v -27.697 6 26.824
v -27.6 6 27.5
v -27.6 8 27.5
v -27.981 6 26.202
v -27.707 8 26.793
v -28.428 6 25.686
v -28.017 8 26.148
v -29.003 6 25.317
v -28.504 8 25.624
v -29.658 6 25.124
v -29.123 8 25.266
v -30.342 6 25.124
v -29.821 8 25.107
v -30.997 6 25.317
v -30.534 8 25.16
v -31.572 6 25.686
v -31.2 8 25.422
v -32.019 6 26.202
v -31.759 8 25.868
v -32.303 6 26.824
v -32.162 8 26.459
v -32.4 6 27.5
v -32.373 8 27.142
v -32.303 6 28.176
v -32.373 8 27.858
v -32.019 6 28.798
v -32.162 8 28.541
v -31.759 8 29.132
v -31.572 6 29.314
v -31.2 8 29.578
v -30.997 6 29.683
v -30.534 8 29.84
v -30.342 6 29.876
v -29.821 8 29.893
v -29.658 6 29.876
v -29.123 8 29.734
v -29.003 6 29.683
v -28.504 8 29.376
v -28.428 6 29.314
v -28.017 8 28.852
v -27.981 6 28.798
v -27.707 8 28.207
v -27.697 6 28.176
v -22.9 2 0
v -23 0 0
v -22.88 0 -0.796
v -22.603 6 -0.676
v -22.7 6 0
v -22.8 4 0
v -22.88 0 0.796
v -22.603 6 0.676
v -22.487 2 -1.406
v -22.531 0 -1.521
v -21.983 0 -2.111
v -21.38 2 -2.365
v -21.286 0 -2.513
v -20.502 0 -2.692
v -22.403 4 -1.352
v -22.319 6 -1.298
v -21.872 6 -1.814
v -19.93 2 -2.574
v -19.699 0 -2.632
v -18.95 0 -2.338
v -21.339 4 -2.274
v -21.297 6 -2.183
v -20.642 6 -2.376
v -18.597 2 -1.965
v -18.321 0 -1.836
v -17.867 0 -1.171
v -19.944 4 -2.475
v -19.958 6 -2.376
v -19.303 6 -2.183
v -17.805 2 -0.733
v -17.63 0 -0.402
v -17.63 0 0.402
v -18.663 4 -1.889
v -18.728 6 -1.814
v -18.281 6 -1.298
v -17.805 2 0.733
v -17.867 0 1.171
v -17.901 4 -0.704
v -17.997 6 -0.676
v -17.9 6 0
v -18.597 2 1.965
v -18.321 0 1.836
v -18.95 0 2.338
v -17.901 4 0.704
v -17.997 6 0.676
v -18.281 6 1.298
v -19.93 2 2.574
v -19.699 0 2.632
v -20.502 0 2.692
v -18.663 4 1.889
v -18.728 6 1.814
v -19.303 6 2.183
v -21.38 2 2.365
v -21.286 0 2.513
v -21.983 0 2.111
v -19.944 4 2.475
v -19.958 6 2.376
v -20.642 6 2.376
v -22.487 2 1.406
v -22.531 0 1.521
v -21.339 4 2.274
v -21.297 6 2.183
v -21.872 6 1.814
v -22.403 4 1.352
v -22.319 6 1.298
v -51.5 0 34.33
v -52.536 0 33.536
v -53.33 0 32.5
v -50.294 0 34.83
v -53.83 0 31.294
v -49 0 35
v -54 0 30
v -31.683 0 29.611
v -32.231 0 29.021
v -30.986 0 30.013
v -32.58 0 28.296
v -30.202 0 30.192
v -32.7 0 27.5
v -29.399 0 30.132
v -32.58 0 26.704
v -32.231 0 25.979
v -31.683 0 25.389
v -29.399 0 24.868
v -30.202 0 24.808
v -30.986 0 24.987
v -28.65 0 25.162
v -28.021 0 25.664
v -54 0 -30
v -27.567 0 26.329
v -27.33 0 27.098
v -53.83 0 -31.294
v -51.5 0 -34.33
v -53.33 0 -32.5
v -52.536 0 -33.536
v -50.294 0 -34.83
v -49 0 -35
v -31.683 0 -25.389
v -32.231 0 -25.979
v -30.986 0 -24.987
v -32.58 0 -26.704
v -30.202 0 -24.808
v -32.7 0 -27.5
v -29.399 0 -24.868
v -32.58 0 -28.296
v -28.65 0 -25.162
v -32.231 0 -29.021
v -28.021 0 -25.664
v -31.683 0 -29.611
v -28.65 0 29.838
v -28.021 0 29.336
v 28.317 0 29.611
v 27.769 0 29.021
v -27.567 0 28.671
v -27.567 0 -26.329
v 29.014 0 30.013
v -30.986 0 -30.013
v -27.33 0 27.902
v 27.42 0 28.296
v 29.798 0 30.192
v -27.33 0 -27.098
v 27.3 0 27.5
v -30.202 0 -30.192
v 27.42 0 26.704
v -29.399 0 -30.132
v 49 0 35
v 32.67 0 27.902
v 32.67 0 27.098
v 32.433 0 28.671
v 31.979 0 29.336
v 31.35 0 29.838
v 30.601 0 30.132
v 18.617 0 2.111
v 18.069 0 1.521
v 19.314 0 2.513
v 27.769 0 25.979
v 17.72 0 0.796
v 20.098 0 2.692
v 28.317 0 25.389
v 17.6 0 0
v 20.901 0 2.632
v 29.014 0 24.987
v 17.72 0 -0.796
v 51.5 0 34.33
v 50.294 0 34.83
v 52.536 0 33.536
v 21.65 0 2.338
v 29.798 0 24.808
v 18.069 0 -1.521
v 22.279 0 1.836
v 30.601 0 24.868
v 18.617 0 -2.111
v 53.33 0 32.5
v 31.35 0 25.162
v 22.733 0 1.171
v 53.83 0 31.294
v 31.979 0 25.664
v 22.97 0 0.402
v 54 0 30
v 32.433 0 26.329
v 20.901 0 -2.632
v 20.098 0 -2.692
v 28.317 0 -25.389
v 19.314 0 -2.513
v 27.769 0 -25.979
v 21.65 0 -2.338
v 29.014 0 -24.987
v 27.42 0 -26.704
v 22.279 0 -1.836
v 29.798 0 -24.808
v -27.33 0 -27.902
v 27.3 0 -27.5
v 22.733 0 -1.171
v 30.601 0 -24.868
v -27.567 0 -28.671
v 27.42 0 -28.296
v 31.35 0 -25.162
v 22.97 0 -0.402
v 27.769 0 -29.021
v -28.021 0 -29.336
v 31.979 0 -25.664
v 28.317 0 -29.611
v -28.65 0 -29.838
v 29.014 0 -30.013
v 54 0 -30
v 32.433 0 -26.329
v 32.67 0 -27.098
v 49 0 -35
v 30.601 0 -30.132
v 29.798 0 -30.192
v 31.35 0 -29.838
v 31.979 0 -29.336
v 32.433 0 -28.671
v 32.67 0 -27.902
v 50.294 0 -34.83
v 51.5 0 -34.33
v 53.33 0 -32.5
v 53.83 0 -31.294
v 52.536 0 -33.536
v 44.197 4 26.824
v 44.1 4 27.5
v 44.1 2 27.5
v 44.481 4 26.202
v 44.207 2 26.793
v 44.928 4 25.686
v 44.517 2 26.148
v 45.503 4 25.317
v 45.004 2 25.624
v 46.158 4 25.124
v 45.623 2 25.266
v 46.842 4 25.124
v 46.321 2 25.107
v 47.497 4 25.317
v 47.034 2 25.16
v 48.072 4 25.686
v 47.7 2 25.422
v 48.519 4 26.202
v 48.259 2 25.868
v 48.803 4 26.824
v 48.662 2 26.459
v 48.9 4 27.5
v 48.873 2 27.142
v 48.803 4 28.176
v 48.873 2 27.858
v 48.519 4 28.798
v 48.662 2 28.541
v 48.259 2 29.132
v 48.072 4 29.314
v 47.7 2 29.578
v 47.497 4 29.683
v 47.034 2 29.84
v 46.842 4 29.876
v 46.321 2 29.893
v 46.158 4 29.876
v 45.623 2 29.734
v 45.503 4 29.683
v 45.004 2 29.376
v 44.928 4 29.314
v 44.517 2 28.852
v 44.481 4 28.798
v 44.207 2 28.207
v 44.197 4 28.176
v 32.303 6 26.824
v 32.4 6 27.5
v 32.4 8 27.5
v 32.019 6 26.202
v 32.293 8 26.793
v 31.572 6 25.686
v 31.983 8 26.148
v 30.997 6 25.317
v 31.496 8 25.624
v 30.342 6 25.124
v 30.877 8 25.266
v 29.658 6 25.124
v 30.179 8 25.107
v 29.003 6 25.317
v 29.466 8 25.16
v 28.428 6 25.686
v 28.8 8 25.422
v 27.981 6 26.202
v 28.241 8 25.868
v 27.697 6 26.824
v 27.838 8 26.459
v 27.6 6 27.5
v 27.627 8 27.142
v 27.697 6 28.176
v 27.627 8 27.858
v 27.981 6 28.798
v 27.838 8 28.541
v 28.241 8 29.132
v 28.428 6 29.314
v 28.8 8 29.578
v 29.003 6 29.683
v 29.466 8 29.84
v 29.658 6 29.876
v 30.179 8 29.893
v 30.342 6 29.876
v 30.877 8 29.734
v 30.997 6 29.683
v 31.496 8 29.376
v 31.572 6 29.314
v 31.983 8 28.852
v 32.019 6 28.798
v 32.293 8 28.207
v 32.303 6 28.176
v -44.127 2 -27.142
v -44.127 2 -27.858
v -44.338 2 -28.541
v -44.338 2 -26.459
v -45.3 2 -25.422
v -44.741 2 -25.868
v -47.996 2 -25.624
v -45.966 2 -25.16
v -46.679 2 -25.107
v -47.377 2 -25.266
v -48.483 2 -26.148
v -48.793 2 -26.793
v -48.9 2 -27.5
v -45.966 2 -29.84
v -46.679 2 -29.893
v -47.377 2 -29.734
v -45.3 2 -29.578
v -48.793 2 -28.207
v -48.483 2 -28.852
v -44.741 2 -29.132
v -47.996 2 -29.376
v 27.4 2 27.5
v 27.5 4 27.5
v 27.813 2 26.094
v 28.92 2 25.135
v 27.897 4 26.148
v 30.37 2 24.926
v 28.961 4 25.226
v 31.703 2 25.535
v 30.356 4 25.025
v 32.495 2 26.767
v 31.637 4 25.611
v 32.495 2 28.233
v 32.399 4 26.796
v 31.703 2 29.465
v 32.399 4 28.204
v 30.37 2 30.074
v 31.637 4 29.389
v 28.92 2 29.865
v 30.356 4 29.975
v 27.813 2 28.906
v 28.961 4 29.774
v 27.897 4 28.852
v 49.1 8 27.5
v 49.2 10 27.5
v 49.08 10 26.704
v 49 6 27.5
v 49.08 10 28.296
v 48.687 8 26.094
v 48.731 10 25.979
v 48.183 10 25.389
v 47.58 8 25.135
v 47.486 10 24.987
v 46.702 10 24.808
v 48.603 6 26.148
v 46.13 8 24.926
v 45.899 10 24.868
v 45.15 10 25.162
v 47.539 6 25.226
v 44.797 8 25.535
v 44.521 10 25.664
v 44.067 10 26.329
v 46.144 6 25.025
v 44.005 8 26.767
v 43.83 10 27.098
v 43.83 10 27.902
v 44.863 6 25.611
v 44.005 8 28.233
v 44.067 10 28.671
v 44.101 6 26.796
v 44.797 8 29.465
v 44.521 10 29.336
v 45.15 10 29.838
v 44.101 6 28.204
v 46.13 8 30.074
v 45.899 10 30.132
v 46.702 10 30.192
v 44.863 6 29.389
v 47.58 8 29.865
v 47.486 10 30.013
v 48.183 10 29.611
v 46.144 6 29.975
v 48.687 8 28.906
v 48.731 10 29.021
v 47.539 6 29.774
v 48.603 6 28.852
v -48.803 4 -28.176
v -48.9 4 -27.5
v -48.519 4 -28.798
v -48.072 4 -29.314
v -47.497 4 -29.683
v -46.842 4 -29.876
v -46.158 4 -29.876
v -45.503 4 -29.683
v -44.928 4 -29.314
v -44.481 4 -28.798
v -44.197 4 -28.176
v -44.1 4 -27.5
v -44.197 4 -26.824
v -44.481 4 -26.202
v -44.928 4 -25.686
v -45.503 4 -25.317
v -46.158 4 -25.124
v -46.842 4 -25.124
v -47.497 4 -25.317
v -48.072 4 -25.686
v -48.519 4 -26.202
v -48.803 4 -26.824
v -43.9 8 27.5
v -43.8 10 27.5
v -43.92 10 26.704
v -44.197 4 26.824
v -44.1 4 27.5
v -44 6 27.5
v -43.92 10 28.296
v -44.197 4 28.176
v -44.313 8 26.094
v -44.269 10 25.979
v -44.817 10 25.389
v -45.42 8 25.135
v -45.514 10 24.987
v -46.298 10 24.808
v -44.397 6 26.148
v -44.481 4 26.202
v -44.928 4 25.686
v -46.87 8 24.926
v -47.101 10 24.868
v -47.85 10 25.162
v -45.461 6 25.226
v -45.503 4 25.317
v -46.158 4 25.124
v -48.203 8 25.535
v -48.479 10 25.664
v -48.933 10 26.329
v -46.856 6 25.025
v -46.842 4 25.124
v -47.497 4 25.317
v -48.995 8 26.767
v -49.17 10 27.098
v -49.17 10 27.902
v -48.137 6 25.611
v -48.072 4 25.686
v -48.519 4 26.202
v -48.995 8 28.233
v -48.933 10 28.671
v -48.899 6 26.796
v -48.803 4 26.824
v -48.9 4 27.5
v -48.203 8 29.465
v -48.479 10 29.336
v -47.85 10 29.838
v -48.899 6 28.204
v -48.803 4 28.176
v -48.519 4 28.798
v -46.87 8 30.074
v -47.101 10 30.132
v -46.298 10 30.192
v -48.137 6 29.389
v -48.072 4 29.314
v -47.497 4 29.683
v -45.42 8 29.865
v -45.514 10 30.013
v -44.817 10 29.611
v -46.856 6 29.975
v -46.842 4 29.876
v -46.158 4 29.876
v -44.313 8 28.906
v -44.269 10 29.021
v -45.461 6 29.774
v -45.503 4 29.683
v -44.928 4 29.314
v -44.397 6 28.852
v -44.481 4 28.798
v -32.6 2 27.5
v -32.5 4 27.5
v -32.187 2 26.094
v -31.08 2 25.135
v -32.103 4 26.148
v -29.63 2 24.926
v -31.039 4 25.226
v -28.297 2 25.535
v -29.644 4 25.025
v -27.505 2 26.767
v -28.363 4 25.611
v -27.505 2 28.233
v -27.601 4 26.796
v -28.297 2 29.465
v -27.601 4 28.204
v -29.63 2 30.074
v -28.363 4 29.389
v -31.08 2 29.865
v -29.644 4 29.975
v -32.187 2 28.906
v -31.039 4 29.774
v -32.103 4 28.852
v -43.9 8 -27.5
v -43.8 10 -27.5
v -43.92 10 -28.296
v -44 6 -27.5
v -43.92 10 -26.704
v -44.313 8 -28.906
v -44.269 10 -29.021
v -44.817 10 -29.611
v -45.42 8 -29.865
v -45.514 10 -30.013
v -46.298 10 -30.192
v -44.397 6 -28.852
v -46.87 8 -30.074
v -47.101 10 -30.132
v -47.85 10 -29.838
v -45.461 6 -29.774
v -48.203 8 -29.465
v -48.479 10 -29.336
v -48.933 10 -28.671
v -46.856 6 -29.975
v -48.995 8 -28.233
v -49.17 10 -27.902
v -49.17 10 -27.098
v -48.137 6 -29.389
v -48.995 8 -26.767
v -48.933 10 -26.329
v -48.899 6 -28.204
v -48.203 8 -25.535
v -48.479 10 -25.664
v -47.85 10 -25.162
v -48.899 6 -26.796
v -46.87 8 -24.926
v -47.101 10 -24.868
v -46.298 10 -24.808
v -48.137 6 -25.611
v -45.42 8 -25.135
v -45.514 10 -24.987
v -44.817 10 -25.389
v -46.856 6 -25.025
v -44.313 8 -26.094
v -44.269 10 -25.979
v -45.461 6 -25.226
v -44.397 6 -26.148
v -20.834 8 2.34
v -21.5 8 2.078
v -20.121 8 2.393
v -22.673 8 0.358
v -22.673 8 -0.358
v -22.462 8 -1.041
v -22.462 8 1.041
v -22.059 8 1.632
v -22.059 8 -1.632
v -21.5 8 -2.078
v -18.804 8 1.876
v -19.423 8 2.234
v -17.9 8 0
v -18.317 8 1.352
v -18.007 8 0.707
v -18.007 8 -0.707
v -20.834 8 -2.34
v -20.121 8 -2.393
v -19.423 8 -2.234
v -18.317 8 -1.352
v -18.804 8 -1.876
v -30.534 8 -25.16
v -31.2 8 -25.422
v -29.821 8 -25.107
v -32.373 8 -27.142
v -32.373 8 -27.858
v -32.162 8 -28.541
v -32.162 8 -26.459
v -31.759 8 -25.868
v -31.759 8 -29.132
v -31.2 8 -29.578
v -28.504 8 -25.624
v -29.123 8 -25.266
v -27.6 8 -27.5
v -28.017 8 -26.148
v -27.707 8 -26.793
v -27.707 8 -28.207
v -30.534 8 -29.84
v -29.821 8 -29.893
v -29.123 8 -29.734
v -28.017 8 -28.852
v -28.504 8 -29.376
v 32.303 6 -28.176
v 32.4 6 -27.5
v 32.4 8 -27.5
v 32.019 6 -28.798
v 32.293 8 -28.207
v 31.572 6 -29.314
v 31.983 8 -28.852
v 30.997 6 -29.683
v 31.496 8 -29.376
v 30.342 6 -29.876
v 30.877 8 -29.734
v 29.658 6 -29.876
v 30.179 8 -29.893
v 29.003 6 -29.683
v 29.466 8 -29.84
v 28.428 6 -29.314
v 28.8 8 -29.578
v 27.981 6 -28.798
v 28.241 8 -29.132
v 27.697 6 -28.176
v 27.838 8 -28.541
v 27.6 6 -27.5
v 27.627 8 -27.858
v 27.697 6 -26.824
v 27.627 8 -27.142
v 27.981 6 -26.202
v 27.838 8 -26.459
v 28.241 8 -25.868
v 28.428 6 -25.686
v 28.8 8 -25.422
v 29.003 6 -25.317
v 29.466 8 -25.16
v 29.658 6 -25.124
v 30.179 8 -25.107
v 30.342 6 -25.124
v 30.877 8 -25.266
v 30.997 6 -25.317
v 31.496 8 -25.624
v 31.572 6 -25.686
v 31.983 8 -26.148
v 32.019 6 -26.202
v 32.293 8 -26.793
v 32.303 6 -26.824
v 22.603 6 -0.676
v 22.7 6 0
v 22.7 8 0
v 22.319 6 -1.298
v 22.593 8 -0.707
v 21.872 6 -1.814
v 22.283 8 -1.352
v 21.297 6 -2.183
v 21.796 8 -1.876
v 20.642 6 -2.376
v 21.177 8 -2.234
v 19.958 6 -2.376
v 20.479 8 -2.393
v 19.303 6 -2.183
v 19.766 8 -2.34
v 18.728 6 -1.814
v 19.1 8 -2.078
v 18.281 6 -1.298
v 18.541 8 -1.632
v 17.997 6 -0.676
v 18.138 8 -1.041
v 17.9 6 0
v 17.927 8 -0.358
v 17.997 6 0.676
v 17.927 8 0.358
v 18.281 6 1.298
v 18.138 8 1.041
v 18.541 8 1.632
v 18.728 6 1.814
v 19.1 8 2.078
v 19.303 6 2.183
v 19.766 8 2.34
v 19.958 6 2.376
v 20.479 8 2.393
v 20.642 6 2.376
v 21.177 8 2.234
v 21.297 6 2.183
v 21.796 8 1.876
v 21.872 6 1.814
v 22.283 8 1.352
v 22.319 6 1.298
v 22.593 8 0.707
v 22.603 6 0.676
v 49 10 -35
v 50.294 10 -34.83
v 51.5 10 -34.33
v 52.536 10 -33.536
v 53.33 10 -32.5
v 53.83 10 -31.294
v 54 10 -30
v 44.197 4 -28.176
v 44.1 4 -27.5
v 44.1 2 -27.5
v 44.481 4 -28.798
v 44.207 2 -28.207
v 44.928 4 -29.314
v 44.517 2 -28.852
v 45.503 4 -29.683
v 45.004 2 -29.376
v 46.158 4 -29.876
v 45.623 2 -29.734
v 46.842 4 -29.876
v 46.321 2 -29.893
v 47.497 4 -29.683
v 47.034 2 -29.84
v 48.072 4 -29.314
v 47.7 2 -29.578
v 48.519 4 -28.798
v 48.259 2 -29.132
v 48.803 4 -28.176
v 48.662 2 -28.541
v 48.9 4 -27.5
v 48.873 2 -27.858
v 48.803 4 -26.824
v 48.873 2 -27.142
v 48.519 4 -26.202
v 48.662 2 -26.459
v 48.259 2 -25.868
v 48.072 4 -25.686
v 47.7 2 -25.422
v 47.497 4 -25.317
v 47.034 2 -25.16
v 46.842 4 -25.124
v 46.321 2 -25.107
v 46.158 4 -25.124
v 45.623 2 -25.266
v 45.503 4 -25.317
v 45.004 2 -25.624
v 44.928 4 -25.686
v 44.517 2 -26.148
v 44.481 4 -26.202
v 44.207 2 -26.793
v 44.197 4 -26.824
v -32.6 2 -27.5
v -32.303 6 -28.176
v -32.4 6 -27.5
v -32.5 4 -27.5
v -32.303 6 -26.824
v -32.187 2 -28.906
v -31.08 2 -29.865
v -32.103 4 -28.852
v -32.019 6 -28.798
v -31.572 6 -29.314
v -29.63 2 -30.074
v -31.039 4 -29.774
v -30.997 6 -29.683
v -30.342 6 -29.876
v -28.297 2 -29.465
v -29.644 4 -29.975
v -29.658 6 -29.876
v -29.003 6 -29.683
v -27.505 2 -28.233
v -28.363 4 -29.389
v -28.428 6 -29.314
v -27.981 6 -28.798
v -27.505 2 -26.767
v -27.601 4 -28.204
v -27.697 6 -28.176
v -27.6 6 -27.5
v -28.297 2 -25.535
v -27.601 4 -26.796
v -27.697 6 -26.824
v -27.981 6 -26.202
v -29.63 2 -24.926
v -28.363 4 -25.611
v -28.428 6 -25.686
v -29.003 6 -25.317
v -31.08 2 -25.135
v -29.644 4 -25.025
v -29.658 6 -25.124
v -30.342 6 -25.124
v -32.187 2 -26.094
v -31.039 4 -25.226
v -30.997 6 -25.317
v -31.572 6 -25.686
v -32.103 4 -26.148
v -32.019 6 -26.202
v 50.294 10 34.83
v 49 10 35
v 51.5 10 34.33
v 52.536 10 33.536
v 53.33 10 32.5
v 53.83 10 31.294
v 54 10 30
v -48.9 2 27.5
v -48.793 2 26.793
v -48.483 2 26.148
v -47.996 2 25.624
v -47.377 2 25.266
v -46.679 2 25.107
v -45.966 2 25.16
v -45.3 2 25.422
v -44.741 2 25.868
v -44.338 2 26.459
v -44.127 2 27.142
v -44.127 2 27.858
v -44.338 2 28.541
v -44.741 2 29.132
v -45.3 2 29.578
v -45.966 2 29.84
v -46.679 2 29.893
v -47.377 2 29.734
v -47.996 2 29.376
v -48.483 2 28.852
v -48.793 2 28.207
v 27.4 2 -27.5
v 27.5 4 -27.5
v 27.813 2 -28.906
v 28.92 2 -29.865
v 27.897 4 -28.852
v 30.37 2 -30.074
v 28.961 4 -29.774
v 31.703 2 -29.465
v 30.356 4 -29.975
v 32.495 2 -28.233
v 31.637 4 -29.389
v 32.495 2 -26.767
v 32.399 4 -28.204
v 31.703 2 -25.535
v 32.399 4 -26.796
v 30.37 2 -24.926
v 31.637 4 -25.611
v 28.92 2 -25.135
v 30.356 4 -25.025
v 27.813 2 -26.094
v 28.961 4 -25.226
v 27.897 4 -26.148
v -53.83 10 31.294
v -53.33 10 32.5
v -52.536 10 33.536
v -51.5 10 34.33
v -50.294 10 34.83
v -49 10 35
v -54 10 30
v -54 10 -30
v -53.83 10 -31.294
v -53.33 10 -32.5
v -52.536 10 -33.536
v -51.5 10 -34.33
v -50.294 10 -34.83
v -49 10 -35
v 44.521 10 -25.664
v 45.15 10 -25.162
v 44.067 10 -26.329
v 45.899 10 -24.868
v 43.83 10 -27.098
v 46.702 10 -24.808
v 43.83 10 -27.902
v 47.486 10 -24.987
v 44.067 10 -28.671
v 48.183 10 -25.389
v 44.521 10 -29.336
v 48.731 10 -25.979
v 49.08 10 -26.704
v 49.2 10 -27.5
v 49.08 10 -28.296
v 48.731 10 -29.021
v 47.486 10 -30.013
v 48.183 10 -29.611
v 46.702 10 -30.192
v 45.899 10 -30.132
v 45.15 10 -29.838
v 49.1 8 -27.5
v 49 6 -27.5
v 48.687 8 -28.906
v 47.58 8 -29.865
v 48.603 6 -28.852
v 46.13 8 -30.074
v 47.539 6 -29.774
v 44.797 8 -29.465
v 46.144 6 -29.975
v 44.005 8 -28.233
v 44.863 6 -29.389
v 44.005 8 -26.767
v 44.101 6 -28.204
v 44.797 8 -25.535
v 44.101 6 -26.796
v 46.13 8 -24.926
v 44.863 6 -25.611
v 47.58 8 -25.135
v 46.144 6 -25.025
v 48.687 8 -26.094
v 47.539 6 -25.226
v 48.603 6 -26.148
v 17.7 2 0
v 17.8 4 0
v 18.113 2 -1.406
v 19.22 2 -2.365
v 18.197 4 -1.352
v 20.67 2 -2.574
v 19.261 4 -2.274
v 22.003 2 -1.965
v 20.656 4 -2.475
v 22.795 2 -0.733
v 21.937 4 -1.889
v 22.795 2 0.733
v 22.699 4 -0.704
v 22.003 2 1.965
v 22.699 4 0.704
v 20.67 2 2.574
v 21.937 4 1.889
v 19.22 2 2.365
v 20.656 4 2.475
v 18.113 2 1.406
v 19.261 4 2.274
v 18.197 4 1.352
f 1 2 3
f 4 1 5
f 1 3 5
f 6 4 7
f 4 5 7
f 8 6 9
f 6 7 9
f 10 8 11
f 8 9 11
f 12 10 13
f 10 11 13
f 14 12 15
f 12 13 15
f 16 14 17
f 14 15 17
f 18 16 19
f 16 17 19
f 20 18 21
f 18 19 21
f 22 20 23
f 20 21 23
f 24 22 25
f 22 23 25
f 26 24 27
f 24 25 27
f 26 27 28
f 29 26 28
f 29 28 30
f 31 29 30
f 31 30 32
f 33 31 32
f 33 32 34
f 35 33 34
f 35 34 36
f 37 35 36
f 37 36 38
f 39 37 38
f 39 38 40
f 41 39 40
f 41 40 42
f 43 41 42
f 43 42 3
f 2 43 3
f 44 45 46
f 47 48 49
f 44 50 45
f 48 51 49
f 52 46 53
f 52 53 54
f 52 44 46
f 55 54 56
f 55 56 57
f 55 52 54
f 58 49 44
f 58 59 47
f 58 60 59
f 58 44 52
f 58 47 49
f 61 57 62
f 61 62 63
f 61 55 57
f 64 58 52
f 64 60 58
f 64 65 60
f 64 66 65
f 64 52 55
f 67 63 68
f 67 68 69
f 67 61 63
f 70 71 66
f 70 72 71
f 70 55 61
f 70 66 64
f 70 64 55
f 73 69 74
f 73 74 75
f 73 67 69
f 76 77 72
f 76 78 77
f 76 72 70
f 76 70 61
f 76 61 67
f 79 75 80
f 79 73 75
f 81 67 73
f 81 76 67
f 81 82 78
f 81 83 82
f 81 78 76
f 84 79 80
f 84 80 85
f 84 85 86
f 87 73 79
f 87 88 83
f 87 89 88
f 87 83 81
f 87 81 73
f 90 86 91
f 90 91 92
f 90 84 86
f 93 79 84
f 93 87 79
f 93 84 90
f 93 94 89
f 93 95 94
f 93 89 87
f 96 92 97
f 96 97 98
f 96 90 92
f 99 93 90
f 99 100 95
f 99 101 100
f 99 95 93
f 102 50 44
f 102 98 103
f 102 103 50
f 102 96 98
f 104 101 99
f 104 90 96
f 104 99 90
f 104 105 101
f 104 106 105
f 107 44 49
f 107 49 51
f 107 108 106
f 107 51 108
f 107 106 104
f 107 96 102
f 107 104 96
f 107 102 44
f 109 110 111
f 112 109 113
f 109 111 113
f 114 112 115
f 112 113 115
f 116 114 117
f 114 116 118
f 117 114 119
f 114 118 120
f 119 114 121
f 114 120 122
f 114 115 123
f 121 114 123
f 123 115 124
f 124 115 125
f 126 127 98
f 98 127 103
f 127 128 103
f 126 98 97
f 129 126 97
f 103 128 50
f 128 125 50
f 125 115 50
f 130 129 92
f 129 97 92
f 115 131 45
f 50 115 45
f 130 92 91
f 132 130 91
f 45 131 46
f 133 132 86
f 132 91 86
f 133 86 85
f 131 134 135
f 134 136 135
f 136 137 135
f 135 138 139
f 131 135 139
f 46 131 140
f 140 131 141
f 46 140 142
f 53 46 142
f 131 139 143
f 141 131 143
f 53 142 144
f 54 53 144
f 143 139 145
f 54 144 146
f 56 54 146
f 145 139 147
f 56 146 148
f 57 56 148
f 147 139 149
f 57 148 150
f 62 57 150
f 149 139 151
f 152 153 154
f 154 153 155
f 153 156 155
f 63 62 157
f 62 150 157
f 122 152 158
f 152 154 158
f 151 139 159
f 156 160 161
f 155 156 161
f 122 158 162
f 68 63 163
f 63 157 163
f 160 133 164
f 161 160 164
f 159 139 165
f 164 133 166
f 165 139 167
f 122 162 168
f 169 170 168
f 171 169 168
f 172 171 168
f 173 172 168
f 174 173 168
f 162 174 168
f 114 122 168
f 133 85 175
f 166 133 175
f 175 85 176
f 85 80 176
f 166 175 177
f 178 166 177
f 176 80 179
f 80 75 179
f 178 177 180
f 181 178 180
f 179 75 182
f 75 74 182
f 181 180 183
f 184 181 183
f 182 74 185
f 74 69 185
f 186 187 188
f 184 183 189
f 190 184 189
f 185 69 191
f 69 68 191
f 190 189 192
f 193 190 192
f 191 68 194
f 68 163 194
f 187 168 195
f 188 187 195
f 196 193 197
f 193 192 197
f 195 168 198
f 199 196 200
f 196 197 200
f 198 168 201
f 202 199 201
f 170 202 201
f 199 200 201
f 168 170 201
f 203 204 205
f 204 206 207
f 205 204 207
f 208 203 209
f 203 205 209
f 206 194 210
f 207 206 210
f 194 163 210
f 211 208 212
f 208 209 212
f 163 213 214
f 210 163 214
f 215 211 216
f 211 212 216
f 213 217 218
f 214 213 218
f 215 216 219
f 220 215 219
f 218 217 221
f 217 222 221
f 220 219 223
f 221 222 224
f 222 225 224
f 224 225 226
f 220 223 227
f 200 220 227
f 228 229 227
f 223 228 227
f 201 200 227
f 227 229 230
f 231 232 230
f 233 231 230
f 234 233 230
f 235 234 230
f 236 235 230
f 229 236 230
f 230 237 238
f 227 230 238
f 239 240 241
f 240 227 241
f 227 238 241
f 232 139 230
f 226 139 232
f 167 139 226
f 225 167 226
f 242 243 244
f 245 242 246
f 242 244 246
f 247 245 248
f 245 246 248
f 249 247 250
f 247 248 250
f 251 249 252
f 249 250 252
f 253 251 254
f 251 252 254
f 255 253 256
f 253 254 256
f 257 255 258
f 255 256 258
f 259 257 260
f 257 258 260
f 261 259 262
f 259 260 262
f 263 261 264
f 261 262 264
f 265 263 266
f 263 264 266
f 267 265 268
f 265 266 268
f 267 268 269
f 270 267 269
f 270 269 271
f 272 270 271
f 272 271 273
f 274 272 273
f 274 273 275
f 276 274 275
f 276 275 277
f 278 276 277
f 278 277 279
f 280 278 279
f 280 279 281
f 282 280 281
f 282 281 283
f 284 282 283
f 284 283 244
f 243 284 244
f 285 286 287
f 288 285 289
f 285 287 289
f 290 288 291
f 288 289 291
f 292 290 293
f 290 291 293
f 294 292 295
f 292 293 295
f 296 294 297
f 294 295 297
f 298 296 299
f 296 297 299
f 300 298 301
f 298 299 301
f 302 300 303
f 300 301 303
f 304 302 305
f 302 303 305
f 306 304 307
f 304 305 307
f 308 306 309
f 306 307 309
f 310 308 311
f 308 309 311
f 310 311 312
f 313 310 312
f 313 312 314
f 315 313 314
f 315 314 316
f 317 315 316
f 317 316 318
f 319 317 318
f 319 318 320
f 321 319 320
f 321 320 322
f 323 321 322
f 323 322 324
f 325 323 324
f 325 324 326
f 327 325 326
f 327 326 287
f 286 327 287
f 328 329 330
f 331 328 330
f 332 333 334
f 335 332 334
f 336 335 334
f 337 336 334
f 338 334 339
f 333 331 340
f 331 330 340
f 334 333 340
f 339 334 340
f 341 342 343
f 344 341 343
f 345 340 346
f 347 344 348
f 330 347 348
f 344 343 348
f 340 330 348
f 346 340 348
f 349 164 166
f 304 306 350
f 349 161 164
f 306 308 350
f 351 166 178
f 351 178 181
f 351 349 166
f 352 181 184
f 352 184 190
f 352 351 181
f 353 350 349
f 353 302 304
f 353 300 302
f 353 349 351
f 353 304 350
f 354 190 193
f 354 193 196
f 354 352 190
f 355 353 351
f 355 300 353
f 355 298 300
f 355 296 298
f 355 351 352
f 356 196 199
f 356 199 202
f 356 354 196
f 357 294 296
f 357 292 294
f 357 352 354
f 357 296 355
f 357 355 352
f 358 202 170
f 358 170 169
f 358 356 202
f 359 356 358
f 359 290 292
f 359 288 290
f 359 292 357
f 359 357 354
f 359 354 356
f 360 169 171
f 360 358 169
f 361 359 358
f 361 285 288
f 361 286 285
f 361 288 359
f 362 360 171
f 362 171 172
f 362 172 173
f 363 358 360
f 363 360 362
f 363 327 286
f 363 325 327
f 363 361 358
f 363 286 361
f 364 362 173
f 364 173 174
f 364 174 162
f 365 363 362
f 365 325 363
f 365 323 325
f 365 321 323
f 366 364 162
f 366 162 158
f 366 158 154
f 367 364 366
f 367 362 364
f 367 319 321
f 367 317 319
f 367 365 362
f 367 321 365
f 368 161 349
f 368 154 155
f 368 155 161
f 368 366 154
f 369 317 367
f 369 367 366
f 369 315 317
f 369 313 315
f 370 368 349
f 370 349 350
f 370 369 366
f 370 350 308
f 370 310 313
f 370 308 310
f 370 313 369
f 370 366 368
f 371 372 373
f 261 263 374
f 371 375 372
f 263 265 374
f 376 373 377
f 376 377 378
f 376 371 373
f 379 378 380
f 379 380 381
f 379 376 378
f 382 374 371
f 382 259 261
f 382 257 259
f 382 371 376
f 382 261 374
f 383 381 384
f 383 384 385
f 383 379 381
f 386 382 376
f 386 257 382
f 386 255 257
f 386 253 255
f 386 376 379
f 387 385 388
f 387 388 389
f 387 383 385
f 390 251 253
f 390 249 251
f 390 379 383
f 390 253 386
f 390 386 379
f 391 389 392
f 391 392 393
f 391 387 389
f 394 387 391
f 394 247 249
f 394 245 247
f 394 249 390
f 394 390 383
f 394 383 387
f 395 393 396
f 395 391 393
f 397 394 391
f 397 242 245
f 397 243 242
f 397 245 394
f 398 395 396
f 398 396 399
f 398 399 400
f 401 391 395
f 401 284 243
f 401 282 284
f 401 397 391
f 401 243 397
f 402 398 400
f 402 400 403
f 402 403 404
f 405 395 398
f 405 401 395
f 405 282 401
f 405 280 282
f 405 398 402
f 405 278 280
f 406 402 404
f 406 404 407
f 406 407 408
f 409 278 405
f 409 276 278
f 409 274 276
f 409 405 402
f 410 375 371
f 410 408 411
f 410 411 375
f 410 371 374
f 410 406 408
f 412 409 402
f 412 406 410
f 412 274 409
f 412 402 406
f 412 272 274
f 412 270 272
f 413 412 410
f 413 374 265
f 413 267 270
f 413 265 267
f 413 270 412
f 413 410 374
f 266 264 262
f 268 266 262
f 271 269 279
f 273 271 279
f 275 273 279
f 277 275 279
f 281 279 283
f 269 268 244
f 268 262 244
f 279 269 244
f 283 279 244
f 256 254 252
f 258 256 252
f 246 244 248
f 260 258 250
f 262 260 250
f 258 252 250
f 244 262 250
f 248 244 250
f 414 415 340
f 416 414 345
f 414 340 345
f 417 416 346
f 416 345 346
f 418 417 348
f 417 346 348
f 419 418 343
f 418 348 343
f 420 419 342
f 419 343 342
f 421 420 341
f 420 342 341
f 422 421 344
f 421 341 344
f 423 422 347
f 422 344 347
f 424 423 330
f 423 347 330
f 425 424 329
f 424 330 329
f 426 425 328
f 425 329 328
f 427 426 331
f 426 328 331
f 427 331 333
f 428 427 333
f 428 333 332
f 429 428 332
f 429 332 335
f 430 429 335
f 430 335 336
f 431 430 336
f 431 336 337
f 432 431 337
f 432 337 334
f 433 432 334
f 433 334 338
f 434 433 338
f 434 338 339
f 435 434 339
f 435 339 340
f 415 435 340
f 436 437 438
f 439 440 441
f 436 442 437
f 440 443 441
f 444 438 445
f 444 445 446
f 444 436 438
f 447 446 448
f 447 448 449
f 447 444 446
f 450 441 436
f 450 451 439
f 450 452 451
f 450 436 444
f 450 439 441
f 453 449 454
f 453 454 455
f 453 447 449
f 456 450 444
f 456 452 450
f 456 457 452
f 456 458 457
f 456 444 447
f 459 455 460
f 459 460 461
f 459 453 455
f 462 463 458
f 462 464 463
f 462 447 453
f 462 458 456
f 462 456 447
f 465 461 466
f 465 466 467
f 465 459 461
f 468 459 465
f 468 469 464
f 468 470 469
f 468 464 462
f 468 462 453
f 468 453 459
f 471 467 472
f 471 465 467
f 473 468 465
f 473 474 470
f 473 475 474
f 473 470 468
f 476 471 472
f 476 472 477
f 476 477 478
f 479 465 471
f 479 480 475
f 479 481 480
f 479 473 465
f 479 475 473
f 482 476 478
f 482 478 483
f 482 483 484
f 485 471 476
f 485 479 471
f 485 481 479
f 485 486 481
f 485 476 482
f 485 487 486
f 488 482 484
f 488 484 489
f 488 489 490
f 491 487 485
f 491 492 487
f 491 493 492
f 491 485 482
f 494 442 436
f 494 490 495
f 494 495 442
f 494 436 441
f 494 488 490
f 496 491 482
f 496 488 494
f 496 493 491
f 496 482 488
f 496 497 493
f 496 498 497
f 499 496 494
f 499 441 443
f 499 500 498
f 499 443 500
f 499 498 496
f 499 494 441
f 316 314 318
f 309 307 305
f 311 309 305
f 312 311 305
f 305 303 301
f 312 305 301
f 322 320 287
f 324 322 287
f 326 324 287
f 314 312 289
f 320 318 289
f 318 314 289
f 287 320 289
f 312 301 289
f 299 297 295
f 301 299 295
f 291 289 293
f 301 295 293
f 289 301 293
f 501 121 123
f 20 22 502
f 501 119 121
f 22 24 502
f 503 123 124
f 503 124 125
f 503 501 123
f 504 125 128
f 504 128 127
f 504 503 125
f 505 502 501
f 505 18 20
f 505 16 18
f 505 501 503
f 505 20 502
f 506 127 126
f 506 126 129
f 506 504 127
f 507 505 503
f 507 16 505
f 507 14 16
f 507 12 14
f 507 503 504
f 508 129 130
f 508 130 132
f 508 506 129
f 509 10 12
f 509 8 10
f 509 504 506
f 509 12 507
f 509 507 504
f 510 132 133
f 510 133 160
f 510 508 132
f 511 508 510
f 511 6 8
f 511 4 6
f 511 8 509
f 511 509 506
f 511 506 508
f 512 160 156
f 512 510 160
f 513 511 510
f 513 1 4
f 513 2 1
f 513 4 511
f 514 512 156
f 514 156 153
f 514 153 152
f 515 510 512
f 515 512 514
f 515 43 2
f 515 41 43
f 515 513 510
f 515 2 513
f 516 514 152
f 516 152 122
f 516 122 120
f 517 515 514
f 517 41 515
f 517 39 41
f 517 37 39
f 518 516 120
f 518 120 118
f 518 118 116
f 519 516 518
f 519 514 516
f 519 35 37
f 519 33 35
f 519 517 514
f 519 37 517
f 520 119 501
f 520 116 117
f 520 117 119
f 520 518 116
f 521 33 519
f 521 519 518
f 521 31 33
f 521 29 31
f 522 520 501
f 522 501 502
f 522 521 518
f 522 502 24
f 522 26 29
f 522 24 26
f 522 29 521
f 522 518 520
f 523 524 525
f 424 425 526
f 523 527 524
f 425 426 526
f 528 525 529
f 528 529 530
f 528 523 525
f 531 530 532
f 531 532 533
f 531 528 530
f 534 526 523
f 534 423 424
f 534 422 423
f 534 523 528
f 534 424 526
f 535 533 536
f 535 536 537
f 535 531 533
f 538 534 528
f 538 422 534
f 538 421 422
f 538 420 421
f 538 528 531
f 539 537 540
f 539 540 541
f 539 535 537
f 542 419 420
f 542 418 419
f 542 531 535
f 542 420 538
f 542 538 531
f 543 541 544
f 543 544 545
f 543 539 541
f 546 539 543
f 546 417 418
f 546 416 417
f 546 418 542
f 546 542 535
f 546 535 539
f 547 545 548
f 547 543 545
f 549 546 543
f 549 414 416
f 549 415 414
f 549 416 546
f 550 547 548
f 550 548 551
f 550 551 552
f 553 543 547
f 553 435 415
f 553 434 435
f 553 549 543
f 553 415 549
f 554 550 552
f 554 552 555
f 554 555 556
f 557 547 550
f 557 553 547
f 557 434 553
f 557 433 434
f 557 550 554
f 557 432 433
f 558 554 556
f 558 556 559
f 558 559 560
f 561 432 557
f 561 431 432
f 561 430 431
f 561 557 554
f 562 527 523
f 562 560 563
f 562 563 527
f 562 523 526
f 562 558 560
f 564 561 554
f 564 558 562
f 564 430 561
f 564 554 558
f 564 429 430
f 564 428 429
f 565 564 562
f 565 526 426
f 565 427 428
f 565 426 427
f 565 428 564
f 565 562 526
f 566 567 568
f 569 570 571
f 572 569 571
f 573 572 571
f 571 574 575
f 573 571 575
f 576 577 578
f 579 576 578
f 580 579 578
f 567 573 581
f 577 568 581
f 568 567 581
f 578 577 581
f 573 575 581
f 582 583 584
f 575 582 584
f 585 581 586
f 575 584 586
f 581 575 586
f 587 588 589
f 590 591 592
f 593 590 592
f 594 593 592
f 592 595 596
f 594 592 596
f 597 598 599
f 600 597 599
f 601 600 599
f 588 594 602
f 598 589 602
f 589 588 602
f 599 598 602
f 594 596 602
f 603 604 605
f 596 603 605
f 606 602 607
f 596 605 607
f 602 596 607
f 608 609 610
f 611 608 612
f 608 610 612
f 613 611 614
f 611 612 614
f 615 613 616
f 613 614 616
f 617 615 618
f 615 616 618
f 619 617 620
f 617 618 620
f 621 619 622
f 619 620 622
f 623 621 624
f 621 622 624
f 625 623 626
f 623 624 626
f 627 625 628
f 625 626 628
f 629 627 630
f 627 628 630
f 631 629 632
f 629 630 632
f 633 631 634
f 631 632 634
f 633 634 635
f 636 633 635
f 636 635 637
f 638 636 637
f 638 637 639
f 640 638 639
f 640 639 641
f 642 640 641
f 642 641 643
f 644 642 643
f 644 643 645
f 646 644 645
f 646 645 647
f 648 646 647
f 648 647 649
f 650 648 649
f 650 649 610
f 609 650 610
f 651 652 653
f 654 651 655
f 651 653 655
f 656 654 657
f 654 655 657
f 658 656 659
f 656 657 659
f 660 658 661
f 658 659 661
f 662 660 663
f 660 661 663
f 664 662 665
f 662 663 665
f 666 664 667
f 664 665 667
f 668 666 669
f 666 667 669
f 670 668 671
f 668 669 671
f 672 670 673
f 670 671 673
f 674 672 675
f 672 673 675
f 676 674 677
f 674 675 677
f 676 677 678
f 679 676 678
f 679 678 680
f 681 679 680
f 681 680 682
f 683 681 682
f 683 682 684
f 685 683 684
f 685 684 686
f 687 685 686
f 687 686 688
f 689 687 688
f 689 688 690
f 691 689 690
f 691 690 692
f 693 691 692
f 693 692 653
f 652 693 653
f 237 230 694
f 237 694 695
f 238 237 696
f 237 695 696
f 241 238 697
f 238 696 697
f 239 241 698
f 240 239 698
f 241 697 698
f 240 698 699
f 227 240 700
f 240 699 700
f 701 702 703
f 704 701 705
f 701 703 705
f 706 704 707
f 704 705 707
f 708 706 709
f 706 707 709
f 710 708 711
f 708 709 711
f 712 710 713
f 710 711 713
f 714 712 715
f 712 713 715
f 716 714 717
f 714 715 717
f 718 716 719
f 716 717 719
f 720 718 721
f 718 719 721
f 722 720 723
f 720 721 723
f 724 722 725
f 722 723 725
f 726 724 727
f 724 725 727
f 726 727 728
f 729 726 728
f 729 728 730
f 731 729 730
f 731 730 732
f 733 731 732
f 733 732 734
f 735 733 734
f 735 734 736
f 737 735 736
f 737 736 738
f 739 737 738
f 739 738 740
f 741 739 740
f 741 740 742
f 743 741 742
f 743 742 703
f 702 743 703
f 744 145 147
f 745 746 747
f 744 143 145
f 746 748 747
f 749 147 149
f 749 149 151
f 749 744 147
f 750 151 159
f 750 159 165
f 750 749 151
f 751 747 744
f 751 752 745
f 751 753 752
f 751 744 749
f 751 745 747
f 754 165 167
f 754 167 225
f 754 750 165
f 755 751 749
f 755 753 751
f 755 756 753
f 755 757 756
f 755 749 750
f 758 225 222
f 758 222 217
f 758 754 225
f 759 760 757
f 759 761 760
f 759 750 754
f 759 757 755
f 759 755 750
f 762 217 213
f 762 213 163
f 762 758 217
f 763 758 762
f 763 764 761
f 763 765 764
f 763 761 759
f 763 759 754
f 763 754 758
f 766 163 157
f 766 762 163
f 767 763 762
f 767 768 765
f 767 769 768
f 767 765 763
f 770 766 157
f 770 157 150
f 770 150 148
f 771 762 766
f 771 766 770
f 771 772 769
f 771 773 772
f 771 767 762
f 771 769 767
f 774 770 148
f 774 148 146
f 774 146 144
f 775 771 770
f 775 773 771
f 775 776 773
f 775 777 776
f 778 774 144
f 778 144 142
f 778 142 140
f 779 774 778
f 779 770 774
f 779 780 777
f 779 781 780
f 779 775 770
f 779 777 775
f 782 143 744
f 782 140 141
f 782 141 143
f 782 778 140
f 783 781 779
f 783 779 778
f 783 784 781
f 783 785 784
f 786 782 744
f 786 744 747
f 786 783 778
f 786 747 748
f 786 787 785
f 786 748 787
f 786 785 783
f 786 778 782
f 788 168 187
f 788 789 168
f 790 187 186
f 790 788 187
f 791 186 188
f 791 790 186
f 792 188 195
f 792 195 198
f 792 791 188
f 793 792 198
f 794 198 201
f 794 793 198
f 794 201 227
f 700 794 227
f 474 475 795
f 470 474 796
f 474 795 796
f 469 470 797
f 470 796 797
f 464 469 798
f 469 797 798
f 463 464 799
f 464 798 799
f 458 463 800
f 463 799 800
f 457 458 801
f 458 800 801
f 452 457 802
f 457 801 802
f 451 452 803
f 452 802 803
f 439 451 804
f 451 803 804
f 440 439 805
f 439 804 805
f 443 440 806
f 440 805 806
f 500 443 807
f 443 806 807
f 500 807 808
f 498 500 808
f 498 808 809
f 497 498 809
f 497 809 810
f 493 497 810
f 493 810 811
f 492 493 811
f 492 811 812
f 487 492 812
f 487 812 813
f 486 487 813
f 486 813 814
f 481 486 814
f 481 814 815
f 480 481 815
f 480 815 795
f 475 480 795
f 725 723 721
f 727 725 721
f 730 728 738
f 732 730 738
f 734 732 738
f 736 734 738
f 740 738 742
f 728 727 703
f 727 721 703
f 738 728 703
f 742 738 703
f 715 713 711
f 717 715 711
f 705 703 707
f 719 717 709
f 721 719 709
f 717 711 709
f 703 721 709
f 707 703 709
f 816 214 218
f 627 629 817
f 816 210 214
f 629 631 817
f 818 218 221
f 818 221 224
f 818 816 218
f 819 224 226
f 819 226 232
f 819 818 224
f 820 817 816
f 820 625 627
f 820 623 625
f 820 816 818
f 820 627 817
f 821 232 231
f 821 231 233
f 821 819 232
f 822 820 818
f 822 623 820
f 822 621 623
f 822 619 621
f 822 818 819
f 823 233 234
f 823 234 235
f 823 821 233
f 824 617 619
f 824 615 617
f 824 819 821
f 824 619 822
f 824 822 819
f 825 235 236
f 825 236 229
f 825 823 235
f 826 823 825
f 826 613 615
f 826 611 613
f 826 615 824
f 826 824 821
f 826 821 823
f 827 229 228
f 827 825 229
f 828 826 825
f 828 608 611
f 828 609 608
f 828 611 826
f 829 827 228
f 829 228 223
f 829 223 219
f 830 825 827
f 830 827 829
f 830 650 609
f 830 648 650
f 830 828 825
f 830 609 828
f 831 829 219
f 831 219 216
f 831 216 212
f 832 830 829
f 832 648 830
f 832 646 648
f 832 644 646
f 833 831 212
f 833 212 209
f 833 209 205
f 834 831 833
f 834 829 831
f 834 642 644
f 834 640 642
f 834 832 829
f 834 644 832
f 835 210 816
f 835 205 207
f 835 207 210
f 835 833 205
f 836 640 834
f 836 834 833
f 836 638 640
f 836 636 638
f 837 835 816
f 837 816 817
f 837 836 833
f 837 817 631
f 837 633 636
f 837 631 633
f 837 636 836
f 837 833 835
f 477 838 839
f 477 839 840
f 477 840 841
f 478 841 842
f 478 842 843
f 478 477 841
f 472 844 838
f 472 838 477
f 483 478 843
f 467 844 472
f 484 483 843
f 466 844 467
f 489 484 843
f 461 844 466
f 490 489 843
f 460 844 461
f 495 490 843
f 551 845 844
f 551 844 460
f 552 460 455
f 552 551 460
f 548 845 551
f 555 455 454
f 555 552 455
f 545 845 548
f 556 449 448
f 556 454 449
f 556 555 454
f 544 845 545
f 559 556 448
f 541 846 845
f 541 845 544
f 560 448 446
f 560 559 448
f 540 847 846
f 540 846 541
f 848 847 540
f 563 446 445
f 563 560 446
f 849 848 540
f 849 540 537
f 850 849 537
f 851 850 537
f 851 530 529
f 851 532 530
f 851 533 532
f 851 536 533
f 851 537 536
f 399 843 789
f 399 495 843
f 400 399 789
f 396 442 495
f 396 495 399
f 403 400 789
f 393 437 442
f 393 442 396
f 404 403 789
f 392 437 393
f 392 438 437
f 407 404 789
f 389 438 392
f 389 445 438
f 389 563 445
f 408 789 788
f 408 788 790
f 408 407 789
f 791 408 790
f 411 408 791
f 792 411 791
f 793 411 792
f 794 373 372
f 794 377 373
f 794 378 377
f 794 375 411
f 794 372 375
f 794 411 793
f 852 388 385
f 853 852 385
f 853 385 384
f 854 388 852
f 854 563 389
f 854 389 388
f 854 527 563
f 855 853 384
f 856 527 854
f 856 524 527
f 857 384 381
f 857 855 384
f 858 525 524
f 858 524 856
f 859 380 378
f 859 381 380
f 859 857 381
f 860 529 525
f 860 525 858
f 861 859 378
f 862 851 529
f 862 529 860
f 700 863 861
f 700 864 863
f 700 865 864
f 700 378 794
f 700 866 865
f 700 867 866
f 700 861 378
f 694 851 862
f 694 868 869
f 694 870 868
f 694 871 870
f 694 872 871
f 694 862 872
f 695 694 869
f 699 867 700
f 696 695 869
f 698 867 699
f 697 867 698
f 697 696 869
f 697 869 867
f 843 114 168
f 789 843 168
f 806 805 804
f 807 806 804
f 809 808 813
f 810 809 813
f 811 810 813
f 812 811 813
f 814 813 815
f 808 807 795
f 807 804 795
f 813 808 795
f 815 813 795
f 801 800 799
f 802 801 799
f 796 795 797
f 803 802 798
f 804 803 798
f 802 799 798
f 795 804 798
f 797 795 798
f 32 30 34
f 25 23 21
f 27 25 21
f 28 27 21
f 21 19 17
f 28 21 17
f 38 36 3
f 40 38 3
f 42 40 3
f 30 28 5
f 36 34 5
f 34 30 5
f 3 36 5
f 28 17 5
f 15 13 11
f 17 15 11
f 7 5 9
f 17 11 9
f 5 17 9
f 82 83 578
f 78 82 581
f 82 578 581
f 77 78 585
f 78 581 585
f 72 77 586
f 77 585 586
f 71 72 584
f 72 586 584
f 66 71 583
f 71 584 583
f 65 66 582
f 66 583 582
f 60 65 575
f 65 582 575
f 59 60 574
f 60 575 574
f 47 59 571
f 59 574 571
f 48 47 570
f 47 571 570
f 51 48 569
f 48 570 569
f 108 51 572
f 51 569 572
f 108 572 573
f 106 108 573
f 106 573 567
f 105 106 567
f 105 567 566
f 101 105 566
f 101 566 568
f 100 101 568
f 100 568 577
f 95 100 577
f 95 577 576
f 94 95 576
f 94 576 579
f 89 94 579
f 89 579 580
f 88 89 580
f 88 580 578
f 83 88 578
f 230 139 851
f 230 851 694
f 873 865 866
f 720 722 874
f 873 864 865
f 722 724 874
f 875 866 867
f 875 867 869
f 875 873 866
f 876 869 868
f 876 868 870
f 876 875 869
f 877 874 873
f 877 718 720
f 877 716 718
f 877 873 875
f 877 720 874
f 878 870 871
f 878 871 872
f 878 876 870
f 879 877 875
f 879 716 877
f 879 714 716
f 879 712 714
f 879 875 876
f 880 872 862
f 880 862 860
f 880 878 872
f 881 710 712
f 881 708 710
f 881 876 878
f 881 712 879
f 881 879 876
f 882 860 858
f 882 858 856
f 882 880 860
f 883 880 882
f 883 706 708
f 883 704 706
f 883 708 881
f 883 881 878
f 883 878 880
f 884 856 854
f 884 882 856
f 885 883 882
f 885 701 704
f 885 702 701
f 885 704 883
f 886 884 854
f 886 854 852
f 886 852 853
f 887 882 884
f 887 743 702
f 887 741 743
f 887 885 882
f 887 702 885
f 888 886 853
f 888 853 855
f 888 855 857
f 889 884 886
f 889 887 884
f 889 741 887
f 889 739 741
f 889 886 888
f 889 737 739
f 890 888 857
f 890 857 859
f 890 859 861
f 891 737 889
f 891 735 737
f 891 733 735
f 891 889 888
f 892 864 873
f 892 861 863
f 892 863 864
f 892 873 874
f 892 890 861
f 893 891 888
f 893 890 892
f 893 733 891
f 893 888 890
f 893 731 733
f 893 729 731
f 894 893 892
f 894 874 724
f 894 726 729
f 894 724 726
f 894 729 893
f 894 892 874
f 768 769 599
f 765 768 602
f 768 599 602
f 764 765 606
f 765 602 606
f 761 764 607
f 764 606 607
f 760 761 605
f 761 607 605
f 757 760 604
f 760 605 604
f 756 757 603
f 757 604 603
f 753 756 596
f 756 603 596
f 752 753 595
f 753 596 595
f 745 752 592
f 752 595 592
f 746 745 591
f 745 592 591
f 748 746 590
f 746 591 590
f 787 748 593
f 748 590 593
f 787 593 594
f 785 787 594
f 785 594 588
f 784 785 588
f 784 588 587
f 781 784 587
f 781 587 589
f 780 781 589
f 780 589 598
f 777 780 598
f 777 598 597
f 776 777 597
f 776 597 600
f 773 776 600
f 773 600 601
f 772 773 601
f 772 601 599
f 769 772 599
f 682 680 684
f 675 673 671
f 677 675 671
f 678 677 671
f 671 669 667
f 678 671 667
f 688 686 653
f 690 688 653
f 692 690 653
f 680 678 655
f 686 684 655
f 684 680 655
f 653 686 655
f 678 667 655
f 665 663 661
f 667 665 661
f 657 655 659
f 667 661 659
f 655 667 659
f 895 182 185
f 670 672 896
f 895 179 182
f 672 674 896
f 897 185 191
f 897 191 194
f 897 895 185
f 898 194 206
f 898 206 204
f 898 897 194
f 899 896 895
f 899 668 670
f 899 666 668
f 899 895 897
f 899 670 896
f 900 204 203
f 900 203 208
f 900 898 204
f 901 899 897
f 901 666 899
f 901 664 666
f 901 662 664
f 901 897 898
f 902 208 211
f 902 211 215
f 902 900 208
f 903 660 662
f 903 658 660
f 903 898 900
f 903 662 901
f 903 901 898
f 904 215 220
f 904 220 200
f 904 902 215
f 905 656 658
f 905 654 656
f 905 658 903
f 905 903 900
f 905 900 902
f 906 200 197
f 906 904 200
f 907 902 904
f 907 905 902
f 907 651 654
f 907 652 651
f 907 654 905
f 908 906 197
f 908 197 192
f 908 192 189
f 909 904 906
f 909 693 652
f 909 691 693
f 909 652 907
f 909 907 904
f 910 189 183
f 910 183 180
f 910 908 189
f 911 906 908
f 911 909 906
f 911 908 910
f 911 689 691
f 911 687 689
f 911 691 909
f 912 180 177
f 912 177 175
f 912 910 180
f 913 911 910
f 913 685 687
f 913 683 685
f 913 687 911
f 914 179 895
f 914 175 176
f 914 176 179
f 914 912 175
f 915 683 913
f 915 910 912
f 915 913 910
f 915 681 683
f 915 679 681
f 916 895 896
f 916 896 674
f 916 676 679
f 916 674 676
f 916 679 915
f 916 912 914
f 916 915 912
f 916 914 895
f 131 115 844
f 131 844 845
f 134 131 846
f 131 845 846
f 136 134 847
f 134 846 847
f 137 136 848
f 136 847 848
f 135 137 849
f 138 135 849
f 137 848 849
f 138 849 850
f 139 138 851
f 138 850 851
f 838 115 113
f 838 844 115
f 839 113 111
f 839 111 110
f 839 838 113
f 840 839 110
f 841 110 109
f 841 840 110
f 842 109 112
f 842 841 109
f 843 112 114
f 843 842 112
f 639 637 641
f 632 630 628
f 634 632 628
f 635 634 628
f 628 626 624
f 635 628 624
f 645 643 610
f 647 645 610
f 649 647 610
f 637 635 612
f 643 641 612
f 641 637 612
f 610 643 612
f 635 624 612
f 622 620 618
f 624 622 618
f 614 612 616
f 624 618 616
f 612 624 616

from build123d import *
from OCP.BRepFilletAPI import BRepFilletAPI_MakeChamfer

# Parameters (mm, degrees)
SKETCH1_W           = 108
SKETCH1_H           = 70
BOSS_EXTRUDE1_DEPTH = 10
HOLE1_D             = 4.8
HOLE1_DEPTH         = 8
HOLE1_CBORE_D       = 5.4
HOLE1_CBORE_DEPTH   = 6
FILLET1_R           = 5
HOLE3_D             = 4.8
HOLE3_DEPTH         = 8
HOLE3_CBORE_D       = 5.4
HOLE3_CBORE_DEPTH   = 6
CHAMFER1_SIZE       = 6
CHAMFER1_SIZE_2     = 0.3


with BuildPart() as part:
    # Sketch1 → Boss-Extrude1 (new body)
    with BuildSketch(Plane(origin=(0, 0, 0), x_dir=(1, 0, 0), z_dir=(0, 1, 0))):
        Rectangle(SKETCH1_W, SKETCH1_H)
    extrude(amount=BOSS_EXTRUDE1_DEPTH)

    # Hole1
    with Locations(Plane(origin=(0, 10, 0), x_dir=(1, 0, 0), z_dir=(0, 1, 0))):
        with Locations((46.5, 27.5), (-46.5, 27.5), (-46.5, -27.5), (46.5, -27.5)):
            CounterBoreHole(HOLE1_D / 2, HOLE1_CBORE_D / 2, HOLE1_CBORE_DEPTH, depth=HOLE1_DEPTH)

    # Fillet1
    fillet1_edges = [part.edges().sort_by_distance(p)[0] for p in [
        (54, 5, 35),
        (-54, 5, 35),
        (-54, 5, -35),
        (54, 5, -35),
    ]]
    fillet(fillet1_edges, radius=FILLET1_R)

    # Hole3
    with Locations(Plane(origin=(0, 0, 0), x_dir=(-1, 0, 0), z_dir=(0, -1, 0))):
        with Locations((-20.3, 0), (20.3, 0), (-30, 27.5), (30, 27.5), (30, -27.5), (-30, -27.5)):
            CounterBoreHole(HOLE3_D / 2, HOLE3_CBORE_D / 2, HOLE3_CBORE_DEPTH, depth=HOLE3_DEPTH)

    # Chamfer1
    chamfer1_edges_1 = [part.edges().sort_by_distance(p)[0] for p in [
        (43.8, 4, 27.5),
    ]]
    chamfer1_side_1 = [part.faces().sort_by_distance(p)[0] for p in [
        (43.8, 4.006, 27.5),
    ]]
    chamfer1_edges_2 = [part.edges().sort_by_distance(p)[0] for p in [
        (-49.2, 4, 27.5),
    ]]
    chamfer1_side_2 = [part.faces().sort_by_distance(p)[0] for p in [
        (-49.2, 4.006, 27.5),
    ]]
    chamfer1_edges_3 = [part.edges().sort_by_distance(p)[0] for p in [
        (-49.2, 4, -27.5),
    ]]
    chamfer1_side_3 = [part.faces().sort_by_distance(p)[0] for p in [
        (-49.2, 4.006, -27.5),
    ]]
    chamfer1_edges_4 = [part.edges().sort_by_distance(p)[0] for p in [
        (43.8, 4, -27.5),
    ]]
    chamfer1_side_4 = [part.faces().sort_by_distance(p)[0] for p in [
        (43.8, 4.006, -27.5),
    ]]
    chamfer1_edges_5 = [part.edges().sort_by_distance(p)[0] for p in [
        (32.7, 6, 27.5),
    ]]
    chamfer1_side_5 = [part.faces().sort_by_distance(p)[0] for p in [
        (32.7, 5.994, 27.5),
    ]]
    chamfer1_edges_6 = [part.edges().sort_by_distance(p)[0] for p in [
        (-27.3, 6, 27.5),
    ]]
    chamfer1_side_6 = [part.faces().sort_by_distance(p)[0] for p in [
        (-27.3, 5.994, 27.5),
    ]]
    chamfer1_edges_7 = [part.edges().sort_by_distance(p)[0] for p in [
        (-27.3, 6, -27.5),
    ]]
    chamfer1_side_7 = [part.faces().sort_by_distance(p)[0] for p in [
        (-27.3, 5.994, -27.5),
    ]]
    chamfer1_edges_8 = [part.edges().sort_by_distance(p)[0] for p in [
        (32.7, 6, -27.5),
    ]]
    chamfer1_side_8 = [part.faces().sort_by_distance(p)[0] for p in [
        (32.7, 5.994, -27.5),
    ]]
    chamfer1_edges_9 = [part.edges().sort_by_distance(p)[0] for p in [
        (-17.6, 6, 0),
    ]]
    chamfer1_side_9 = [part.faces().sort_by_distance(p)[0] for p in [
        (-17.6, 5.994, 0),
    ]]
    chamfer1_edges_10 = [part.edges().sort_by_distance(p)[0] for p in [
        (23, 6, 0),
    ]]
    chamfer1_side_10 = [part.faces().sort_by_distance(p)[0] for p in [
        (23, 5.994, 0),
    ]]
    chamfer1 = BRepFilletAPI_MakeChamfer(part.part.solid().wrapped)
    for e in chamfer1_edges_1:
        chamfer1.Add(CHAMFER1_SIZE - 0.0001, CHAMFER1_SIZE_2 - 0.0001, e.wrapped, chamfer1_side_1[0].wrapped)
    for e in chamfer1_edges_2:
        chamfer1.Add(CHAMFER1_SIZE - 0.0001, CHAMFER1_SIZE_2 - 0.0001, e.wrapped, chamfer1_side_2[0].wrapped)
    for e in chamfer1_edges_3:
        chamfer1.Add(CHAMFER1_SIZE - 0.0001, CHAMFER1_SIZE_2 - 0.0001, e.wrapped, chamfer1_side_3[0].wrapped)
    for e in chamfer1_edges_4:
        chamfer1.Add(CHAMFER1_SIZE - 0.0001, CHAMFER1_SIZE_2 - 0.0001, e.wrapped, chamfer1_side_4[0].wrapped)
    for e in chamfer1_edges_5:
        chamfer1.Add(CHAMFER1_SIZE - 0.0001, CHAMFER1_SIZE_2 - 0.0001, e.wrapped, chamfer1_side_5[0].wrapped)
    for e in chamfer1_edges_6:
        chamfer1.Add(CHAMFER1_SIZE - 0.0001, CHAMFER1_SIZE_2 - 0.0001, e.wrapped, chamfer1_side_6[0].wrapped)
    for e in chamfer1_edges_7:
        chamfer1.Add(CHAMFER1_SIZE - 0.0001, CHAMFER1_SIZE_2 - 0.0001, e.wrapped, chamfer1_side_7[0].wrapped)
    for e in chamfer1_edges_8:
        chamfer1.Add(CHAMFER1_SIZE - 0.0001, CHAMFER1_SIZE_2 - 0.0001, e.wrapped, chamfer1_side_8[0].wrapped)
    for e in chamfer1_edges_9:
        chamfer1.Add(CHAMFER1_SIZE - 0.0001, CHAMFER1_SIZE_2 - 0.0001, e.wrapped, chamfer1_side_9[0].wrapped)
    for e in chamfer1_edges_10:
        chamfer1.Add(CHAMFER1_SIZE - 0.0001, CHAMFER1_SIZE_2 - 0.0001, e.wrapped, chamfer1_side_10[0].wrapped)
    add(Compound.cast(chamfer1.Shape()), mode=Mode.REPLACE)  # a hair under: the kernel refuses the full size


solid = part.part
